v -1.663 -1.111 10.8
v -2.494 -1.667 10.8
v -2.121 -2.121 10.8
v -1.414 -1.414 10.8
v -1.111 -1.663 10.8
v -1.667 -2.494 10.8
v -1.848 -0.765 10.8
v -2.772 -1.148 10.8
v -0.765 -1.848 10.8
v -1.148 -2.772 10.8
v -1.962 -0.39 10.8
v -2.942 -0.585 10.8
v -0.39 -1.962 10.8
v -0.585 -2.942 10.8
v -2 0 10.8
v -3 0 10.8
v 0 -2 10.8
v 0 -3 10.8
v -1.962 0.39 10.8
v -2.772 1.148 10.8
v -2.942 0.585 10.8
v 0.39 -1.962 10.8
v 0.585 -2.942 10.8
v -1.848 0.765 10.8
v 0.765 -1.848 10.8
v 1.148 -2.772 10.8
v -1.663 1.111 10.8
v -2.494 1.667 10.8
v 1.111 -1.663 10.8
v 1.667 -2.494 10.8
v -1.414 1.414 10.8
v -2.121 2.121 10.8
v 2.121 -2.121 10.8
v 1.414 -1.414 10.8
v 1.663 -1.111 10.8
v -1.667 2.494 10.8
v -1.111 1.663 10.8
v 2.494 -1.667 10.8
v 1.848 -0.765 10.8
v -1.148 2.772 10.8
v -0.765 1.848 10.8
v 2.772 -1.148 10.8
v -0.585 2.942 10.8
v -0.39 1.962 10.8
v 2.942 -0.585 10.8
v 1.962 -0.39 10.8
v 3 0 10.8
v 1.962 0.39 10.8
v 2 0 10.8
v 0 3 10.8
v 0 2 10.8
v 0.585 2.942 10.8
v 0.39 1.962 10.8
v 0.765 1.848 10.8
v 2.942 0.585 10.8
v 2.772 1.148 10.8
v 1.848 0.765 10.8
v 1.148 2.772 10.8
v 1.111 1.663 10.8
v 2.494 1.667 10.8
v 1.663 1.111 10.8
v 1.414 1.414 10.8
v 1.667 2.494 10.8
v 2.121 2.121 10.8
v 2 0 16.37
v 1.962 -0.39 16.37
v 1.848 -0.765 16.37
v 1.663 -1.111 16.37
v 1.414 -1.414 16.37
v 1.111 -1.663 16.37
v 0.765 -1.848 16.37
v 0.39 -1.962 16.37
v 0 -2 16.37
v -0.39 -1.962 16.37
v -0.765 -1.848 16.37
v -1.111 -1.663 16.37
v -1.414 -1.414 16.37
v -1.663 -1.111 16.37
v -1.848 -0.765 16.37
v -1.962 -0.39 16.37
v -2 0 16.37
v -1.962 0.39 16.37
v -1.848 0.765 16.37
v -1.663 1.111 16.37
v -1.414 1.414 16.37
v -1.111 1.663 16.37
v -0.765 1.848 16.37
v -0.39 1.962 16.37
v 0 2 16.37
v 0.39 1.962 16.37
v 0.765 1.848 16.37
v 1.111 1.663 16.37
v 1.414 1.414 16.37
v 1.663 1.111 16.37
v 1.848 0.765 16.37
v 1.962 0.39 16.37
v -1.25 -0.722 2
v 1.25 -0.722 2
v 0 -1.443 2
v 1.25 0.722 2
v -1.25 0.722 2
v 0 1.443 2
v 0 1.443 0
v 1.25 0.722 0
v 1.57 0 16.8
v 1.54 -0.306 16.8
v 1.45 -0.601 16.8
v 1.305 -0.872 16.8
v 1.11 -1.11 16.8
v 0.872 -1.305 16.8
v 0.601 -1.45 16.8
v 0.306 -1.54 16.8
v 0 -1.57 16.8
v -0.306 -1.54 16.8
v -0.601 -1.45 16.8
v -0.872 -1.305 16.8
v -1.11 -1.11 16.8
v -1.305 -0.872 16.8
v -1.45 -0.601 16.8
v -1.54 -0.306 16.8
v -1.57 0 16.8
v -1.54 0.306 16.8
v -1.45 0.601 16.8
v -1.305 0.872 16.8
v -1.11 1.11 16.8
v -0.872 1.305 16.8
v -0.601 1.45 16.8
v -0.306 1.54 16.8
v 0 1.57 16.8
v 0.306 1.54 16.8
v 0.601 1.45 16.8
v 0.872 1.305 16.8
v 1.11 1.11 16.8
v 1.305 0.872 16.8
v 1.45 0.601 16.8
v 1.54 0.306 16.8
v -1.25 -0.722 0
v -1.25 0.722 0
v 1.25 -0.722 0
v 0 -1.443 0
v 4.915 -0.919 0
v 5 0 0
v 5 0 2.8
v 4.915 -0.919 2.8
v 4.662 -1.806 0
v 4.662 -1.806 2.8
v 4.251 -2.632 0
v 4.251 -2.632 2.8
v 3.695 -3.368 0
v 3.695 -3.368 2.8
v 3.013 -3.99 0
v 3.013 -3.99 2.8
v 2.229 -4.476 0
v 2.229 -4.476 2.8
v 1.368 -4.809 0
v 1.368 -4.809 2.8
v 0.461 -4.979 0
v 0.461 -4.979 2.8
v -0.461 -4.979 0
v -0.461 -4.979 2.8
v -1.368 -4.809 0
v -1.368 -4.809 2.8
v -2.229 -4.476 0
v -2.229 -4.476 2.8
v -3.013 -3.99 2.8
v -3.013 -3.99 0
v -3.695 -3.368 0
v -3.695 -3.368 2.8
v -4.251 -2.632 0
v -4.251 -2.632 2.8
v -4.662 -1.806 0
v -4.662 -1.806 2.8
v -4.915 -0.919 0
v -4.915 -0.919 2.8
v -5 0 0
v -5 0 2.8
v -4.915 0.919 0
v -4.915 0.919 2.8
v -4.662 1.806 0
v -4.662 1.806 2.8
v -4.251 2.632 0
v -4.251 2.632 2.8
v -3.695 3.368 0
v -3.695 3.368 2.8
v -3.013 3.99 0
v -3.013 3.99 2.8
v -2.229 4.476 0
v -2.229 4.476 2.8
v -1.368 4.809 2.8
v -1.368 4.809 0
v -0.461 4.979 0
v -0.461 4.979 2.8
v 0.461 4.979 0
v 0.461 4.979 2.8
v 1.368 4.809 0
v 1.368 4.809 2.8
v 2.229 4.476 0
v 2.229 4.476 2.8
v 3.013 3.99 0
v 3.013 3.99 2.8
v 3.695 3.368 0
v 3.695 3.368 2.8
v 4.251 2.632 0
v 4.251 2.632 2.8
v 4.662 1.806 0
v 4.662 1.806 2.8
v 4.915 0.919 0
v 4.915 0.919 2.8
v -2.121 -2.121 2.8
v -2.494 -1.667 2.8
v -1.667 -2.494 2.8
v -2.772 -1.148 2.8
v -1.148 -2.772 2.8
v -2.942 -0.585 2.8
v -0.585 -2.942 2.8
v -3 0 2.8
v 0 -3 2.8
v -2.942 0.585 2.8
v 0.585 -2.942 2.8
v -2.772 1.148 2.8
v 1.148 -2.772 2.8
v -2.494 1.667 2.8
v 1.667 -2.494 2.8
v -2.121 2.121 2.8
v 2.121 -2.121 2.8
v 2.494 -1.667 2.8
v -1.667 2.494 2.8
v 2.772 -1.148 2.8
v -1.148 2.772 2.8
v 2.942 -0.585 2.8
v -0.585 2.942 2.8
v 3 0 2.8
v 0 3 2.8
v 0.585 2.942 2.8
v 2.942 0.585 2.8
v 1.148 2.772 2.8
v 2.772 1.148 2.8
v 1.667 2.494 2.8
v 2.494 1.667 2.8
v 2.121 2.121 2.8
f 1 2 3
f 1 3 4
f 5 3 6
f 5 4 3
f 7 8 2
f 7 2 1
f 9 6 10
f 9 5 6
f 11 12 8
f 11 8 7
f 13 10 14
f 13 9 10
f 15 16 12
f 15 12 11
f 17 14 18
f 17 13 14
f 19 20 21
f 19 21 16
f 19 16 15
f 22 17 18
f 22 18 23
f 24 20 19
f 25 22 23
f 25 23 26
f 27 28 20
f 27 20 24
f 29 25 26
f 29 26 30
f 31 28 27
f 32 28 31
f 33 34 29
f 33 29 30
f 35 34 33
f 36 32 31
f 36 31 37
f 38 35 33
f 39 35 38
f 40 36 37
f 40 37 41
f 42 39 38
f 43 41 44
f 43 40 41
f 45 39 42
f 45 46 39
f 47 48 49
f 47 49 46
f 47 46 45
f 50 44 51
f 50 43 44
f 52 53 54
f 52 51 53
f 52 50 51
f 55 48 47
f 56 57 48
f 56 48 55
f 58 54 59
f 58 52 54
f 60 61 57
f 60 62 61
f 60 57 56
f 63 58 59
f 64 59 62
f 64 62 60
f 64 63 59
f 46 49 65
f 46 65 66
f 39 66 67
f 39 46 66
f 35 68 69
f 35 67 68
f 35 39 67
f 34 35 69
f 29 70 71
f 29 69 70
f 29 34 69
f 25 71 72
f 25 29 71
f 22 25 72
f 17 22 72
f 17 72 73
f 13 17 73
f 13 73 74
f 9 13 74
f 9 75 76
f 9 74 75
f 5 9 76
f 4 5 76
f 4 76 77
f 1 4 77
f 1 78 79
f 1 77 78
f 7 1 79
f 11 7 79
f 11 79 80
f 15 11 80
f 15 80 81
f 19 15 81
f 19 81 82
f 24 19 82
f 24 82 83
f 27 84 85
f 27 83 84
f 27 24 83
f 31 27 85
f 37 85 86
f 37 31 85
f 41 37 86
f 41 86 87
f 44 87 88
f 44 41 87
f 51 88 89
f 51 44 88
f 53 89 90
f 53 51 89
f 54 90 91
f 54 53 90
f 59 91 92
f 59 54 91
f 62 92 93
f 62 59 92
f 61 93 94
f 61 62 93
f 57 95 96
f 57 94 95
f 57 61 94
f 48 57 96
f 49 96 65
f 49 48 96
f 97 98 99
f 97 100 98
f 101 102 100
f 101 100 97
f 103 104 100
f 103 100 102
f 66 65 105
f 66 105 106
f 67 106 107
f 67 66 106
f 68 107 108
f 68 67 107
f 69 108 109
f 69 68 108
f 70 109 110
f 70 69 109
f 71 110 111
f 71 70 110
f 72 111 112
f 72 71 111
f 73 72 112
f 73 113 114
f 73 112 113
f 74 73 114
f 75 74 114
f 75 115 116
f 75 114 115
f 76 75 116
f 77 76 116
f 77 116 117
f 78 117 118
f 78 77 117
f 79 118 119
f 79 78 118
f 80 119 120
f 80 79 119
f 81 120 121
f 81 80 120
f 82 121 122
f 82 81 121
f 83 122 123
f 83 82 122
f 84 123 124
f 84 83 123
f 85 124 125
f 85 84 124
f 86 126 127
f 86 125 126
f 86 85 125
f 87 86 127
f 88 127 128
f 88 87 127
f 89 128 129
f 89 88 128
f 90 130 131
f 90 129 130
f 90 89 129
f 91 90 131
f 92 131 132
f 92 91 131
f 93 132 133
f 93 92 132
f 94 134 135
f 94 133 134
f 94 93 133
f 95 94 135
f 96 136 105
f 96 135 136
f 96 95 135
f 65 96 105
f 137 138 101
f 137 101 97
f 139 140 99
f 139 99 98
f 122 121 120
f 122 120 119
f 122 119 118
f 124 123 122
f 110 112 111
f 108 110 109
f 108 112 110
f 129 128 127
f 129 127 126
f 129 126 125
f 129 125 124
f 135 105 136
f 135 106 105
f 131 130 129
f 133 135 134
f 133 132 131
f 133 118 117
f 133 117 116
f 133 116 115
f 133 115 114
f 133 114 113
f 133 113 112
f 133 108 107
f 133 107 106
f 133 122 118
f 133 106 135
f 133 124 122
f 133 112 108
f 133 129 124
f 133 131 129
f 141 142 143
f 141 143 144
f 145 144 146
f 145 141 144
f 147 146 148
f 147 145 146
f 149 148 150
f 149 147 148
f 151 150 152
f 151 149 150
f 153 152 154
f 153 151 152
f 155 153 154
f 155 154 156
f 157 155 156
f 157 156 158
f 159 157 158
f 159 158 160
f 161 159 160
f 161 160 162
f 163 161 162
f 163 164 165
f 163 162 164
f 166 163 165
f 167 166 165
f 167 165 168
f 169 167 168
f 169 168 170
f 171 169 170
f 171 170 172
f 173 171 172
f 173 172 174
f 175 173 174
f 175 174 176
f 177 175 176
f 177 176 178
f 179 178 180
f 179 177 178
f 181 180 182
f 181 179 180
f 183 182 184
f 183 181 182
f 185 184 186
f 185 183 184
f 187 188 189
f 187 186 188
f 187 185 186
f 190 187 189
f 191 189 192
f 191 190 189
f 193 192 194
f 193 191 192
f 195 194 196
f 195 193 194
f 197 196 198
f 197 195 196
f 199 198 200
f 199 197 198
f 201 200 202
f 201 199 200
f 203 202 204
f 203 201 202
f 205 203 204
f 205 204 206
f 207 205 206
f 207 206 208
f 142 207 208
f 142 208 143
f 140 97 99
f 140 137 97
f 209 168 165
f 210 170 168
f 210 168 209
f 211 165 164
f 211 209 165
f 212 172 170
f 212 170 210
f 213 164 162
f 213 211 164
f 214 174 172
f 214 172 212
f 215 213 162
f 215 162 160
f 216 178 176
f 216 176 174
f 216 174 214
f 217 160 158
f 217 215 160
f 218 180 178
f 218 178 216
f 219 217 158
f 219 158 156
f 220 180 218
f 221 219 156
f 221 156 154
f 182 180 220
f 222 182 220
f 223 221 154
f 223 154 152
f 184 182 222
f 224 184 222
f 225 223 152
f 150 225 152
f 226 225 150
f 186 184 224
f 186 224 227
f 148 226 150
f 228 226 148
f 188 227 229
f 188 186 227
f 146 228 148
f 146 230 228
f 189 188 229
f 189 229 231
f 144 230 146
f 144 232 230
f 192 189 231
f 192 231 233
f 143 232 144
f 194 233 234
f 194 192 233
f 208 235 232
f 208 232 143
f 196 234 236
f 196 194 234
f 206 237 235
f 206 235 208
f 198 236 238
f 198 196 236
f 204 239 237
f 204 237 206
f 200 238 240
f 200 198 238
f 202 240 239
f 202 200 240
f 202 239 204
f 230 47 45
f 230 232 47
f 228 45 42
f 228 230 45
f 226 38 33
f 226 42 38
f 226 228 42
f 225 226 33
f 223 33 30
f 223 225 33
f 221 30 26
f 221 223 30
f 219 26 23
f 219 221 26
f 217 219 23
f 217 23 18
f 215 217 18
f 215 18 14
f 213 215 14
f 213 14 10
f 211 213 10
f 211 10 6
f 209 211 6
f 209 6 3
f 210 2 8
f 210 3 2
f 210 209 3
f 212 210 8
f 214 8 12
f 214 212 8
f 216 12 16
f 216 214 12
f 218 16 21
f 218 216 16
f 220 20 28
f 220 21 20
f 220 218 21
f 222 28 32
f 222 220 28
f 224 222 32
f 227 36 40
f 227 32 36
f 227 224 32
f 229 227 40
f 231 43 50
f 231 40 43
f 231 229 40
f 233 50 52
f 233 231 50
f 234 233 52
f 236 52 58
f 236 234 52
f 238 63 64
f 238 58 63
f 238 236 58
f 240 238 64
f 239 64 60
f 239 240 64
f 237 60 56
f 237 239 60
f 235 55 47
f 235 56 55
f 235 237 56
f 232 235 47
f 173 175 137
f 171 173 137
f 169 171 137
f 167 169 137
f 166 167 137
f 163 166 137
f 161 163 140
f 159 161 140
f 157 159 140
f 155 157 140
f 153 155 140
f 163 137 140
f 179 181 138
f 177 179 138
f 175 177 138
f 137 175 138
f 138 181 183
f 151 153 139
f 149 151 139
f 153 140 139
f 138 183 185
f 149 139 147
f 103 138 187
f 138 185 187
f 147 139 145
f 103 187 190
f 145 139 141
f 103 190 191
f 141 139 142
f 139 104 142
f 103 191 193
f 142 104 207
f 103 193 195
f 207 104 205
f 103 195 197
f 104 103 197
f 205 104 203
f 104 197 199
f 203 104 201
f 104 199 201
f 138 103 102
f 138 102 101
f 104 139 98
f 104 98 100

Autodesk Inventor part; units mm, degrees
ref_plane "YZ Plane" through (0, 0, 0) normal (1, 0, 0) x (0, 1, 0)
ref_plane "XZ Plane" through (0, 0, 0) normal (0, 1, 0) x (-1, 0, 0)
ref_plane "XY Plane" through (0, 0, 0) normal (0, 0, 1) x (1, 0, 0)
sketch "Sketch1" plane through (0, 0, 0) normal (0, 1, 0) x (-1, 0, 0)
  line L0 (0, 0) -> (0, 16.8)
  line L1 (0, 16.8) -> (-2, 16.8)
  line L2 (-2, 16.8) -> (-2, 10.8)
  line L3 (-2, 10.8) -> (-3, 10.8)
  line L4 (-3, 10.8) -> (-3, 2.8)
  line L5 (-3, 2.8) -> (-5, 2.8)
  line L6 (-5, 2.8) -> (-5, 0)
  line L7 (-5, 0) -> (0, 0)
  dimension "d0" = 10
  dimension "d1" = 6
  dimension "d2" = 4
  dimension "d3" = 6
  dimension "d4" = 8
  dimension "d5" = 2.8
revolve "Revolution1" add sketch "Sketch1" angle 360 about axis through (0, 0, 0) along (0, 0, 1)
thread "Thread1" size "M4x0.7" class "6g" standard "ANSI Metric M Profile" length 6 offset 1.2
sketch "Sketch2" plane through (0, 0, 0) normal (0, 0, -1) x (-1, 0, 0)
  line L0 (0, 1.4434) -> (1.25, 0.7217)
  line L1 (1.25, 0.7217) -> (1.25, -0.7217)
  line L2 (1.25, -0.7217) -> (0, -1.4434)
  line L3 (0, -1.4434) -> (-1.25, -0.7217)
  line L4 (-1.25, -0.7217) -> (-1.25, 0.7217)
  line L5 (-1.25, 0.7217) -> (0, 1.4434)
  point P0 (0, 0)
  point P1 (0, 0)
  dimension "d9" = 2.5
extrude "Extrusion1" cut sketch "Sketch2" against normal blind 2
chamfer "Chamfer1" distance 0.43 angle 45 1 edges at (-2, 0, 16.8)
properties part number "DBSY4-8-6" material "Stainless Steel AISI 304"
